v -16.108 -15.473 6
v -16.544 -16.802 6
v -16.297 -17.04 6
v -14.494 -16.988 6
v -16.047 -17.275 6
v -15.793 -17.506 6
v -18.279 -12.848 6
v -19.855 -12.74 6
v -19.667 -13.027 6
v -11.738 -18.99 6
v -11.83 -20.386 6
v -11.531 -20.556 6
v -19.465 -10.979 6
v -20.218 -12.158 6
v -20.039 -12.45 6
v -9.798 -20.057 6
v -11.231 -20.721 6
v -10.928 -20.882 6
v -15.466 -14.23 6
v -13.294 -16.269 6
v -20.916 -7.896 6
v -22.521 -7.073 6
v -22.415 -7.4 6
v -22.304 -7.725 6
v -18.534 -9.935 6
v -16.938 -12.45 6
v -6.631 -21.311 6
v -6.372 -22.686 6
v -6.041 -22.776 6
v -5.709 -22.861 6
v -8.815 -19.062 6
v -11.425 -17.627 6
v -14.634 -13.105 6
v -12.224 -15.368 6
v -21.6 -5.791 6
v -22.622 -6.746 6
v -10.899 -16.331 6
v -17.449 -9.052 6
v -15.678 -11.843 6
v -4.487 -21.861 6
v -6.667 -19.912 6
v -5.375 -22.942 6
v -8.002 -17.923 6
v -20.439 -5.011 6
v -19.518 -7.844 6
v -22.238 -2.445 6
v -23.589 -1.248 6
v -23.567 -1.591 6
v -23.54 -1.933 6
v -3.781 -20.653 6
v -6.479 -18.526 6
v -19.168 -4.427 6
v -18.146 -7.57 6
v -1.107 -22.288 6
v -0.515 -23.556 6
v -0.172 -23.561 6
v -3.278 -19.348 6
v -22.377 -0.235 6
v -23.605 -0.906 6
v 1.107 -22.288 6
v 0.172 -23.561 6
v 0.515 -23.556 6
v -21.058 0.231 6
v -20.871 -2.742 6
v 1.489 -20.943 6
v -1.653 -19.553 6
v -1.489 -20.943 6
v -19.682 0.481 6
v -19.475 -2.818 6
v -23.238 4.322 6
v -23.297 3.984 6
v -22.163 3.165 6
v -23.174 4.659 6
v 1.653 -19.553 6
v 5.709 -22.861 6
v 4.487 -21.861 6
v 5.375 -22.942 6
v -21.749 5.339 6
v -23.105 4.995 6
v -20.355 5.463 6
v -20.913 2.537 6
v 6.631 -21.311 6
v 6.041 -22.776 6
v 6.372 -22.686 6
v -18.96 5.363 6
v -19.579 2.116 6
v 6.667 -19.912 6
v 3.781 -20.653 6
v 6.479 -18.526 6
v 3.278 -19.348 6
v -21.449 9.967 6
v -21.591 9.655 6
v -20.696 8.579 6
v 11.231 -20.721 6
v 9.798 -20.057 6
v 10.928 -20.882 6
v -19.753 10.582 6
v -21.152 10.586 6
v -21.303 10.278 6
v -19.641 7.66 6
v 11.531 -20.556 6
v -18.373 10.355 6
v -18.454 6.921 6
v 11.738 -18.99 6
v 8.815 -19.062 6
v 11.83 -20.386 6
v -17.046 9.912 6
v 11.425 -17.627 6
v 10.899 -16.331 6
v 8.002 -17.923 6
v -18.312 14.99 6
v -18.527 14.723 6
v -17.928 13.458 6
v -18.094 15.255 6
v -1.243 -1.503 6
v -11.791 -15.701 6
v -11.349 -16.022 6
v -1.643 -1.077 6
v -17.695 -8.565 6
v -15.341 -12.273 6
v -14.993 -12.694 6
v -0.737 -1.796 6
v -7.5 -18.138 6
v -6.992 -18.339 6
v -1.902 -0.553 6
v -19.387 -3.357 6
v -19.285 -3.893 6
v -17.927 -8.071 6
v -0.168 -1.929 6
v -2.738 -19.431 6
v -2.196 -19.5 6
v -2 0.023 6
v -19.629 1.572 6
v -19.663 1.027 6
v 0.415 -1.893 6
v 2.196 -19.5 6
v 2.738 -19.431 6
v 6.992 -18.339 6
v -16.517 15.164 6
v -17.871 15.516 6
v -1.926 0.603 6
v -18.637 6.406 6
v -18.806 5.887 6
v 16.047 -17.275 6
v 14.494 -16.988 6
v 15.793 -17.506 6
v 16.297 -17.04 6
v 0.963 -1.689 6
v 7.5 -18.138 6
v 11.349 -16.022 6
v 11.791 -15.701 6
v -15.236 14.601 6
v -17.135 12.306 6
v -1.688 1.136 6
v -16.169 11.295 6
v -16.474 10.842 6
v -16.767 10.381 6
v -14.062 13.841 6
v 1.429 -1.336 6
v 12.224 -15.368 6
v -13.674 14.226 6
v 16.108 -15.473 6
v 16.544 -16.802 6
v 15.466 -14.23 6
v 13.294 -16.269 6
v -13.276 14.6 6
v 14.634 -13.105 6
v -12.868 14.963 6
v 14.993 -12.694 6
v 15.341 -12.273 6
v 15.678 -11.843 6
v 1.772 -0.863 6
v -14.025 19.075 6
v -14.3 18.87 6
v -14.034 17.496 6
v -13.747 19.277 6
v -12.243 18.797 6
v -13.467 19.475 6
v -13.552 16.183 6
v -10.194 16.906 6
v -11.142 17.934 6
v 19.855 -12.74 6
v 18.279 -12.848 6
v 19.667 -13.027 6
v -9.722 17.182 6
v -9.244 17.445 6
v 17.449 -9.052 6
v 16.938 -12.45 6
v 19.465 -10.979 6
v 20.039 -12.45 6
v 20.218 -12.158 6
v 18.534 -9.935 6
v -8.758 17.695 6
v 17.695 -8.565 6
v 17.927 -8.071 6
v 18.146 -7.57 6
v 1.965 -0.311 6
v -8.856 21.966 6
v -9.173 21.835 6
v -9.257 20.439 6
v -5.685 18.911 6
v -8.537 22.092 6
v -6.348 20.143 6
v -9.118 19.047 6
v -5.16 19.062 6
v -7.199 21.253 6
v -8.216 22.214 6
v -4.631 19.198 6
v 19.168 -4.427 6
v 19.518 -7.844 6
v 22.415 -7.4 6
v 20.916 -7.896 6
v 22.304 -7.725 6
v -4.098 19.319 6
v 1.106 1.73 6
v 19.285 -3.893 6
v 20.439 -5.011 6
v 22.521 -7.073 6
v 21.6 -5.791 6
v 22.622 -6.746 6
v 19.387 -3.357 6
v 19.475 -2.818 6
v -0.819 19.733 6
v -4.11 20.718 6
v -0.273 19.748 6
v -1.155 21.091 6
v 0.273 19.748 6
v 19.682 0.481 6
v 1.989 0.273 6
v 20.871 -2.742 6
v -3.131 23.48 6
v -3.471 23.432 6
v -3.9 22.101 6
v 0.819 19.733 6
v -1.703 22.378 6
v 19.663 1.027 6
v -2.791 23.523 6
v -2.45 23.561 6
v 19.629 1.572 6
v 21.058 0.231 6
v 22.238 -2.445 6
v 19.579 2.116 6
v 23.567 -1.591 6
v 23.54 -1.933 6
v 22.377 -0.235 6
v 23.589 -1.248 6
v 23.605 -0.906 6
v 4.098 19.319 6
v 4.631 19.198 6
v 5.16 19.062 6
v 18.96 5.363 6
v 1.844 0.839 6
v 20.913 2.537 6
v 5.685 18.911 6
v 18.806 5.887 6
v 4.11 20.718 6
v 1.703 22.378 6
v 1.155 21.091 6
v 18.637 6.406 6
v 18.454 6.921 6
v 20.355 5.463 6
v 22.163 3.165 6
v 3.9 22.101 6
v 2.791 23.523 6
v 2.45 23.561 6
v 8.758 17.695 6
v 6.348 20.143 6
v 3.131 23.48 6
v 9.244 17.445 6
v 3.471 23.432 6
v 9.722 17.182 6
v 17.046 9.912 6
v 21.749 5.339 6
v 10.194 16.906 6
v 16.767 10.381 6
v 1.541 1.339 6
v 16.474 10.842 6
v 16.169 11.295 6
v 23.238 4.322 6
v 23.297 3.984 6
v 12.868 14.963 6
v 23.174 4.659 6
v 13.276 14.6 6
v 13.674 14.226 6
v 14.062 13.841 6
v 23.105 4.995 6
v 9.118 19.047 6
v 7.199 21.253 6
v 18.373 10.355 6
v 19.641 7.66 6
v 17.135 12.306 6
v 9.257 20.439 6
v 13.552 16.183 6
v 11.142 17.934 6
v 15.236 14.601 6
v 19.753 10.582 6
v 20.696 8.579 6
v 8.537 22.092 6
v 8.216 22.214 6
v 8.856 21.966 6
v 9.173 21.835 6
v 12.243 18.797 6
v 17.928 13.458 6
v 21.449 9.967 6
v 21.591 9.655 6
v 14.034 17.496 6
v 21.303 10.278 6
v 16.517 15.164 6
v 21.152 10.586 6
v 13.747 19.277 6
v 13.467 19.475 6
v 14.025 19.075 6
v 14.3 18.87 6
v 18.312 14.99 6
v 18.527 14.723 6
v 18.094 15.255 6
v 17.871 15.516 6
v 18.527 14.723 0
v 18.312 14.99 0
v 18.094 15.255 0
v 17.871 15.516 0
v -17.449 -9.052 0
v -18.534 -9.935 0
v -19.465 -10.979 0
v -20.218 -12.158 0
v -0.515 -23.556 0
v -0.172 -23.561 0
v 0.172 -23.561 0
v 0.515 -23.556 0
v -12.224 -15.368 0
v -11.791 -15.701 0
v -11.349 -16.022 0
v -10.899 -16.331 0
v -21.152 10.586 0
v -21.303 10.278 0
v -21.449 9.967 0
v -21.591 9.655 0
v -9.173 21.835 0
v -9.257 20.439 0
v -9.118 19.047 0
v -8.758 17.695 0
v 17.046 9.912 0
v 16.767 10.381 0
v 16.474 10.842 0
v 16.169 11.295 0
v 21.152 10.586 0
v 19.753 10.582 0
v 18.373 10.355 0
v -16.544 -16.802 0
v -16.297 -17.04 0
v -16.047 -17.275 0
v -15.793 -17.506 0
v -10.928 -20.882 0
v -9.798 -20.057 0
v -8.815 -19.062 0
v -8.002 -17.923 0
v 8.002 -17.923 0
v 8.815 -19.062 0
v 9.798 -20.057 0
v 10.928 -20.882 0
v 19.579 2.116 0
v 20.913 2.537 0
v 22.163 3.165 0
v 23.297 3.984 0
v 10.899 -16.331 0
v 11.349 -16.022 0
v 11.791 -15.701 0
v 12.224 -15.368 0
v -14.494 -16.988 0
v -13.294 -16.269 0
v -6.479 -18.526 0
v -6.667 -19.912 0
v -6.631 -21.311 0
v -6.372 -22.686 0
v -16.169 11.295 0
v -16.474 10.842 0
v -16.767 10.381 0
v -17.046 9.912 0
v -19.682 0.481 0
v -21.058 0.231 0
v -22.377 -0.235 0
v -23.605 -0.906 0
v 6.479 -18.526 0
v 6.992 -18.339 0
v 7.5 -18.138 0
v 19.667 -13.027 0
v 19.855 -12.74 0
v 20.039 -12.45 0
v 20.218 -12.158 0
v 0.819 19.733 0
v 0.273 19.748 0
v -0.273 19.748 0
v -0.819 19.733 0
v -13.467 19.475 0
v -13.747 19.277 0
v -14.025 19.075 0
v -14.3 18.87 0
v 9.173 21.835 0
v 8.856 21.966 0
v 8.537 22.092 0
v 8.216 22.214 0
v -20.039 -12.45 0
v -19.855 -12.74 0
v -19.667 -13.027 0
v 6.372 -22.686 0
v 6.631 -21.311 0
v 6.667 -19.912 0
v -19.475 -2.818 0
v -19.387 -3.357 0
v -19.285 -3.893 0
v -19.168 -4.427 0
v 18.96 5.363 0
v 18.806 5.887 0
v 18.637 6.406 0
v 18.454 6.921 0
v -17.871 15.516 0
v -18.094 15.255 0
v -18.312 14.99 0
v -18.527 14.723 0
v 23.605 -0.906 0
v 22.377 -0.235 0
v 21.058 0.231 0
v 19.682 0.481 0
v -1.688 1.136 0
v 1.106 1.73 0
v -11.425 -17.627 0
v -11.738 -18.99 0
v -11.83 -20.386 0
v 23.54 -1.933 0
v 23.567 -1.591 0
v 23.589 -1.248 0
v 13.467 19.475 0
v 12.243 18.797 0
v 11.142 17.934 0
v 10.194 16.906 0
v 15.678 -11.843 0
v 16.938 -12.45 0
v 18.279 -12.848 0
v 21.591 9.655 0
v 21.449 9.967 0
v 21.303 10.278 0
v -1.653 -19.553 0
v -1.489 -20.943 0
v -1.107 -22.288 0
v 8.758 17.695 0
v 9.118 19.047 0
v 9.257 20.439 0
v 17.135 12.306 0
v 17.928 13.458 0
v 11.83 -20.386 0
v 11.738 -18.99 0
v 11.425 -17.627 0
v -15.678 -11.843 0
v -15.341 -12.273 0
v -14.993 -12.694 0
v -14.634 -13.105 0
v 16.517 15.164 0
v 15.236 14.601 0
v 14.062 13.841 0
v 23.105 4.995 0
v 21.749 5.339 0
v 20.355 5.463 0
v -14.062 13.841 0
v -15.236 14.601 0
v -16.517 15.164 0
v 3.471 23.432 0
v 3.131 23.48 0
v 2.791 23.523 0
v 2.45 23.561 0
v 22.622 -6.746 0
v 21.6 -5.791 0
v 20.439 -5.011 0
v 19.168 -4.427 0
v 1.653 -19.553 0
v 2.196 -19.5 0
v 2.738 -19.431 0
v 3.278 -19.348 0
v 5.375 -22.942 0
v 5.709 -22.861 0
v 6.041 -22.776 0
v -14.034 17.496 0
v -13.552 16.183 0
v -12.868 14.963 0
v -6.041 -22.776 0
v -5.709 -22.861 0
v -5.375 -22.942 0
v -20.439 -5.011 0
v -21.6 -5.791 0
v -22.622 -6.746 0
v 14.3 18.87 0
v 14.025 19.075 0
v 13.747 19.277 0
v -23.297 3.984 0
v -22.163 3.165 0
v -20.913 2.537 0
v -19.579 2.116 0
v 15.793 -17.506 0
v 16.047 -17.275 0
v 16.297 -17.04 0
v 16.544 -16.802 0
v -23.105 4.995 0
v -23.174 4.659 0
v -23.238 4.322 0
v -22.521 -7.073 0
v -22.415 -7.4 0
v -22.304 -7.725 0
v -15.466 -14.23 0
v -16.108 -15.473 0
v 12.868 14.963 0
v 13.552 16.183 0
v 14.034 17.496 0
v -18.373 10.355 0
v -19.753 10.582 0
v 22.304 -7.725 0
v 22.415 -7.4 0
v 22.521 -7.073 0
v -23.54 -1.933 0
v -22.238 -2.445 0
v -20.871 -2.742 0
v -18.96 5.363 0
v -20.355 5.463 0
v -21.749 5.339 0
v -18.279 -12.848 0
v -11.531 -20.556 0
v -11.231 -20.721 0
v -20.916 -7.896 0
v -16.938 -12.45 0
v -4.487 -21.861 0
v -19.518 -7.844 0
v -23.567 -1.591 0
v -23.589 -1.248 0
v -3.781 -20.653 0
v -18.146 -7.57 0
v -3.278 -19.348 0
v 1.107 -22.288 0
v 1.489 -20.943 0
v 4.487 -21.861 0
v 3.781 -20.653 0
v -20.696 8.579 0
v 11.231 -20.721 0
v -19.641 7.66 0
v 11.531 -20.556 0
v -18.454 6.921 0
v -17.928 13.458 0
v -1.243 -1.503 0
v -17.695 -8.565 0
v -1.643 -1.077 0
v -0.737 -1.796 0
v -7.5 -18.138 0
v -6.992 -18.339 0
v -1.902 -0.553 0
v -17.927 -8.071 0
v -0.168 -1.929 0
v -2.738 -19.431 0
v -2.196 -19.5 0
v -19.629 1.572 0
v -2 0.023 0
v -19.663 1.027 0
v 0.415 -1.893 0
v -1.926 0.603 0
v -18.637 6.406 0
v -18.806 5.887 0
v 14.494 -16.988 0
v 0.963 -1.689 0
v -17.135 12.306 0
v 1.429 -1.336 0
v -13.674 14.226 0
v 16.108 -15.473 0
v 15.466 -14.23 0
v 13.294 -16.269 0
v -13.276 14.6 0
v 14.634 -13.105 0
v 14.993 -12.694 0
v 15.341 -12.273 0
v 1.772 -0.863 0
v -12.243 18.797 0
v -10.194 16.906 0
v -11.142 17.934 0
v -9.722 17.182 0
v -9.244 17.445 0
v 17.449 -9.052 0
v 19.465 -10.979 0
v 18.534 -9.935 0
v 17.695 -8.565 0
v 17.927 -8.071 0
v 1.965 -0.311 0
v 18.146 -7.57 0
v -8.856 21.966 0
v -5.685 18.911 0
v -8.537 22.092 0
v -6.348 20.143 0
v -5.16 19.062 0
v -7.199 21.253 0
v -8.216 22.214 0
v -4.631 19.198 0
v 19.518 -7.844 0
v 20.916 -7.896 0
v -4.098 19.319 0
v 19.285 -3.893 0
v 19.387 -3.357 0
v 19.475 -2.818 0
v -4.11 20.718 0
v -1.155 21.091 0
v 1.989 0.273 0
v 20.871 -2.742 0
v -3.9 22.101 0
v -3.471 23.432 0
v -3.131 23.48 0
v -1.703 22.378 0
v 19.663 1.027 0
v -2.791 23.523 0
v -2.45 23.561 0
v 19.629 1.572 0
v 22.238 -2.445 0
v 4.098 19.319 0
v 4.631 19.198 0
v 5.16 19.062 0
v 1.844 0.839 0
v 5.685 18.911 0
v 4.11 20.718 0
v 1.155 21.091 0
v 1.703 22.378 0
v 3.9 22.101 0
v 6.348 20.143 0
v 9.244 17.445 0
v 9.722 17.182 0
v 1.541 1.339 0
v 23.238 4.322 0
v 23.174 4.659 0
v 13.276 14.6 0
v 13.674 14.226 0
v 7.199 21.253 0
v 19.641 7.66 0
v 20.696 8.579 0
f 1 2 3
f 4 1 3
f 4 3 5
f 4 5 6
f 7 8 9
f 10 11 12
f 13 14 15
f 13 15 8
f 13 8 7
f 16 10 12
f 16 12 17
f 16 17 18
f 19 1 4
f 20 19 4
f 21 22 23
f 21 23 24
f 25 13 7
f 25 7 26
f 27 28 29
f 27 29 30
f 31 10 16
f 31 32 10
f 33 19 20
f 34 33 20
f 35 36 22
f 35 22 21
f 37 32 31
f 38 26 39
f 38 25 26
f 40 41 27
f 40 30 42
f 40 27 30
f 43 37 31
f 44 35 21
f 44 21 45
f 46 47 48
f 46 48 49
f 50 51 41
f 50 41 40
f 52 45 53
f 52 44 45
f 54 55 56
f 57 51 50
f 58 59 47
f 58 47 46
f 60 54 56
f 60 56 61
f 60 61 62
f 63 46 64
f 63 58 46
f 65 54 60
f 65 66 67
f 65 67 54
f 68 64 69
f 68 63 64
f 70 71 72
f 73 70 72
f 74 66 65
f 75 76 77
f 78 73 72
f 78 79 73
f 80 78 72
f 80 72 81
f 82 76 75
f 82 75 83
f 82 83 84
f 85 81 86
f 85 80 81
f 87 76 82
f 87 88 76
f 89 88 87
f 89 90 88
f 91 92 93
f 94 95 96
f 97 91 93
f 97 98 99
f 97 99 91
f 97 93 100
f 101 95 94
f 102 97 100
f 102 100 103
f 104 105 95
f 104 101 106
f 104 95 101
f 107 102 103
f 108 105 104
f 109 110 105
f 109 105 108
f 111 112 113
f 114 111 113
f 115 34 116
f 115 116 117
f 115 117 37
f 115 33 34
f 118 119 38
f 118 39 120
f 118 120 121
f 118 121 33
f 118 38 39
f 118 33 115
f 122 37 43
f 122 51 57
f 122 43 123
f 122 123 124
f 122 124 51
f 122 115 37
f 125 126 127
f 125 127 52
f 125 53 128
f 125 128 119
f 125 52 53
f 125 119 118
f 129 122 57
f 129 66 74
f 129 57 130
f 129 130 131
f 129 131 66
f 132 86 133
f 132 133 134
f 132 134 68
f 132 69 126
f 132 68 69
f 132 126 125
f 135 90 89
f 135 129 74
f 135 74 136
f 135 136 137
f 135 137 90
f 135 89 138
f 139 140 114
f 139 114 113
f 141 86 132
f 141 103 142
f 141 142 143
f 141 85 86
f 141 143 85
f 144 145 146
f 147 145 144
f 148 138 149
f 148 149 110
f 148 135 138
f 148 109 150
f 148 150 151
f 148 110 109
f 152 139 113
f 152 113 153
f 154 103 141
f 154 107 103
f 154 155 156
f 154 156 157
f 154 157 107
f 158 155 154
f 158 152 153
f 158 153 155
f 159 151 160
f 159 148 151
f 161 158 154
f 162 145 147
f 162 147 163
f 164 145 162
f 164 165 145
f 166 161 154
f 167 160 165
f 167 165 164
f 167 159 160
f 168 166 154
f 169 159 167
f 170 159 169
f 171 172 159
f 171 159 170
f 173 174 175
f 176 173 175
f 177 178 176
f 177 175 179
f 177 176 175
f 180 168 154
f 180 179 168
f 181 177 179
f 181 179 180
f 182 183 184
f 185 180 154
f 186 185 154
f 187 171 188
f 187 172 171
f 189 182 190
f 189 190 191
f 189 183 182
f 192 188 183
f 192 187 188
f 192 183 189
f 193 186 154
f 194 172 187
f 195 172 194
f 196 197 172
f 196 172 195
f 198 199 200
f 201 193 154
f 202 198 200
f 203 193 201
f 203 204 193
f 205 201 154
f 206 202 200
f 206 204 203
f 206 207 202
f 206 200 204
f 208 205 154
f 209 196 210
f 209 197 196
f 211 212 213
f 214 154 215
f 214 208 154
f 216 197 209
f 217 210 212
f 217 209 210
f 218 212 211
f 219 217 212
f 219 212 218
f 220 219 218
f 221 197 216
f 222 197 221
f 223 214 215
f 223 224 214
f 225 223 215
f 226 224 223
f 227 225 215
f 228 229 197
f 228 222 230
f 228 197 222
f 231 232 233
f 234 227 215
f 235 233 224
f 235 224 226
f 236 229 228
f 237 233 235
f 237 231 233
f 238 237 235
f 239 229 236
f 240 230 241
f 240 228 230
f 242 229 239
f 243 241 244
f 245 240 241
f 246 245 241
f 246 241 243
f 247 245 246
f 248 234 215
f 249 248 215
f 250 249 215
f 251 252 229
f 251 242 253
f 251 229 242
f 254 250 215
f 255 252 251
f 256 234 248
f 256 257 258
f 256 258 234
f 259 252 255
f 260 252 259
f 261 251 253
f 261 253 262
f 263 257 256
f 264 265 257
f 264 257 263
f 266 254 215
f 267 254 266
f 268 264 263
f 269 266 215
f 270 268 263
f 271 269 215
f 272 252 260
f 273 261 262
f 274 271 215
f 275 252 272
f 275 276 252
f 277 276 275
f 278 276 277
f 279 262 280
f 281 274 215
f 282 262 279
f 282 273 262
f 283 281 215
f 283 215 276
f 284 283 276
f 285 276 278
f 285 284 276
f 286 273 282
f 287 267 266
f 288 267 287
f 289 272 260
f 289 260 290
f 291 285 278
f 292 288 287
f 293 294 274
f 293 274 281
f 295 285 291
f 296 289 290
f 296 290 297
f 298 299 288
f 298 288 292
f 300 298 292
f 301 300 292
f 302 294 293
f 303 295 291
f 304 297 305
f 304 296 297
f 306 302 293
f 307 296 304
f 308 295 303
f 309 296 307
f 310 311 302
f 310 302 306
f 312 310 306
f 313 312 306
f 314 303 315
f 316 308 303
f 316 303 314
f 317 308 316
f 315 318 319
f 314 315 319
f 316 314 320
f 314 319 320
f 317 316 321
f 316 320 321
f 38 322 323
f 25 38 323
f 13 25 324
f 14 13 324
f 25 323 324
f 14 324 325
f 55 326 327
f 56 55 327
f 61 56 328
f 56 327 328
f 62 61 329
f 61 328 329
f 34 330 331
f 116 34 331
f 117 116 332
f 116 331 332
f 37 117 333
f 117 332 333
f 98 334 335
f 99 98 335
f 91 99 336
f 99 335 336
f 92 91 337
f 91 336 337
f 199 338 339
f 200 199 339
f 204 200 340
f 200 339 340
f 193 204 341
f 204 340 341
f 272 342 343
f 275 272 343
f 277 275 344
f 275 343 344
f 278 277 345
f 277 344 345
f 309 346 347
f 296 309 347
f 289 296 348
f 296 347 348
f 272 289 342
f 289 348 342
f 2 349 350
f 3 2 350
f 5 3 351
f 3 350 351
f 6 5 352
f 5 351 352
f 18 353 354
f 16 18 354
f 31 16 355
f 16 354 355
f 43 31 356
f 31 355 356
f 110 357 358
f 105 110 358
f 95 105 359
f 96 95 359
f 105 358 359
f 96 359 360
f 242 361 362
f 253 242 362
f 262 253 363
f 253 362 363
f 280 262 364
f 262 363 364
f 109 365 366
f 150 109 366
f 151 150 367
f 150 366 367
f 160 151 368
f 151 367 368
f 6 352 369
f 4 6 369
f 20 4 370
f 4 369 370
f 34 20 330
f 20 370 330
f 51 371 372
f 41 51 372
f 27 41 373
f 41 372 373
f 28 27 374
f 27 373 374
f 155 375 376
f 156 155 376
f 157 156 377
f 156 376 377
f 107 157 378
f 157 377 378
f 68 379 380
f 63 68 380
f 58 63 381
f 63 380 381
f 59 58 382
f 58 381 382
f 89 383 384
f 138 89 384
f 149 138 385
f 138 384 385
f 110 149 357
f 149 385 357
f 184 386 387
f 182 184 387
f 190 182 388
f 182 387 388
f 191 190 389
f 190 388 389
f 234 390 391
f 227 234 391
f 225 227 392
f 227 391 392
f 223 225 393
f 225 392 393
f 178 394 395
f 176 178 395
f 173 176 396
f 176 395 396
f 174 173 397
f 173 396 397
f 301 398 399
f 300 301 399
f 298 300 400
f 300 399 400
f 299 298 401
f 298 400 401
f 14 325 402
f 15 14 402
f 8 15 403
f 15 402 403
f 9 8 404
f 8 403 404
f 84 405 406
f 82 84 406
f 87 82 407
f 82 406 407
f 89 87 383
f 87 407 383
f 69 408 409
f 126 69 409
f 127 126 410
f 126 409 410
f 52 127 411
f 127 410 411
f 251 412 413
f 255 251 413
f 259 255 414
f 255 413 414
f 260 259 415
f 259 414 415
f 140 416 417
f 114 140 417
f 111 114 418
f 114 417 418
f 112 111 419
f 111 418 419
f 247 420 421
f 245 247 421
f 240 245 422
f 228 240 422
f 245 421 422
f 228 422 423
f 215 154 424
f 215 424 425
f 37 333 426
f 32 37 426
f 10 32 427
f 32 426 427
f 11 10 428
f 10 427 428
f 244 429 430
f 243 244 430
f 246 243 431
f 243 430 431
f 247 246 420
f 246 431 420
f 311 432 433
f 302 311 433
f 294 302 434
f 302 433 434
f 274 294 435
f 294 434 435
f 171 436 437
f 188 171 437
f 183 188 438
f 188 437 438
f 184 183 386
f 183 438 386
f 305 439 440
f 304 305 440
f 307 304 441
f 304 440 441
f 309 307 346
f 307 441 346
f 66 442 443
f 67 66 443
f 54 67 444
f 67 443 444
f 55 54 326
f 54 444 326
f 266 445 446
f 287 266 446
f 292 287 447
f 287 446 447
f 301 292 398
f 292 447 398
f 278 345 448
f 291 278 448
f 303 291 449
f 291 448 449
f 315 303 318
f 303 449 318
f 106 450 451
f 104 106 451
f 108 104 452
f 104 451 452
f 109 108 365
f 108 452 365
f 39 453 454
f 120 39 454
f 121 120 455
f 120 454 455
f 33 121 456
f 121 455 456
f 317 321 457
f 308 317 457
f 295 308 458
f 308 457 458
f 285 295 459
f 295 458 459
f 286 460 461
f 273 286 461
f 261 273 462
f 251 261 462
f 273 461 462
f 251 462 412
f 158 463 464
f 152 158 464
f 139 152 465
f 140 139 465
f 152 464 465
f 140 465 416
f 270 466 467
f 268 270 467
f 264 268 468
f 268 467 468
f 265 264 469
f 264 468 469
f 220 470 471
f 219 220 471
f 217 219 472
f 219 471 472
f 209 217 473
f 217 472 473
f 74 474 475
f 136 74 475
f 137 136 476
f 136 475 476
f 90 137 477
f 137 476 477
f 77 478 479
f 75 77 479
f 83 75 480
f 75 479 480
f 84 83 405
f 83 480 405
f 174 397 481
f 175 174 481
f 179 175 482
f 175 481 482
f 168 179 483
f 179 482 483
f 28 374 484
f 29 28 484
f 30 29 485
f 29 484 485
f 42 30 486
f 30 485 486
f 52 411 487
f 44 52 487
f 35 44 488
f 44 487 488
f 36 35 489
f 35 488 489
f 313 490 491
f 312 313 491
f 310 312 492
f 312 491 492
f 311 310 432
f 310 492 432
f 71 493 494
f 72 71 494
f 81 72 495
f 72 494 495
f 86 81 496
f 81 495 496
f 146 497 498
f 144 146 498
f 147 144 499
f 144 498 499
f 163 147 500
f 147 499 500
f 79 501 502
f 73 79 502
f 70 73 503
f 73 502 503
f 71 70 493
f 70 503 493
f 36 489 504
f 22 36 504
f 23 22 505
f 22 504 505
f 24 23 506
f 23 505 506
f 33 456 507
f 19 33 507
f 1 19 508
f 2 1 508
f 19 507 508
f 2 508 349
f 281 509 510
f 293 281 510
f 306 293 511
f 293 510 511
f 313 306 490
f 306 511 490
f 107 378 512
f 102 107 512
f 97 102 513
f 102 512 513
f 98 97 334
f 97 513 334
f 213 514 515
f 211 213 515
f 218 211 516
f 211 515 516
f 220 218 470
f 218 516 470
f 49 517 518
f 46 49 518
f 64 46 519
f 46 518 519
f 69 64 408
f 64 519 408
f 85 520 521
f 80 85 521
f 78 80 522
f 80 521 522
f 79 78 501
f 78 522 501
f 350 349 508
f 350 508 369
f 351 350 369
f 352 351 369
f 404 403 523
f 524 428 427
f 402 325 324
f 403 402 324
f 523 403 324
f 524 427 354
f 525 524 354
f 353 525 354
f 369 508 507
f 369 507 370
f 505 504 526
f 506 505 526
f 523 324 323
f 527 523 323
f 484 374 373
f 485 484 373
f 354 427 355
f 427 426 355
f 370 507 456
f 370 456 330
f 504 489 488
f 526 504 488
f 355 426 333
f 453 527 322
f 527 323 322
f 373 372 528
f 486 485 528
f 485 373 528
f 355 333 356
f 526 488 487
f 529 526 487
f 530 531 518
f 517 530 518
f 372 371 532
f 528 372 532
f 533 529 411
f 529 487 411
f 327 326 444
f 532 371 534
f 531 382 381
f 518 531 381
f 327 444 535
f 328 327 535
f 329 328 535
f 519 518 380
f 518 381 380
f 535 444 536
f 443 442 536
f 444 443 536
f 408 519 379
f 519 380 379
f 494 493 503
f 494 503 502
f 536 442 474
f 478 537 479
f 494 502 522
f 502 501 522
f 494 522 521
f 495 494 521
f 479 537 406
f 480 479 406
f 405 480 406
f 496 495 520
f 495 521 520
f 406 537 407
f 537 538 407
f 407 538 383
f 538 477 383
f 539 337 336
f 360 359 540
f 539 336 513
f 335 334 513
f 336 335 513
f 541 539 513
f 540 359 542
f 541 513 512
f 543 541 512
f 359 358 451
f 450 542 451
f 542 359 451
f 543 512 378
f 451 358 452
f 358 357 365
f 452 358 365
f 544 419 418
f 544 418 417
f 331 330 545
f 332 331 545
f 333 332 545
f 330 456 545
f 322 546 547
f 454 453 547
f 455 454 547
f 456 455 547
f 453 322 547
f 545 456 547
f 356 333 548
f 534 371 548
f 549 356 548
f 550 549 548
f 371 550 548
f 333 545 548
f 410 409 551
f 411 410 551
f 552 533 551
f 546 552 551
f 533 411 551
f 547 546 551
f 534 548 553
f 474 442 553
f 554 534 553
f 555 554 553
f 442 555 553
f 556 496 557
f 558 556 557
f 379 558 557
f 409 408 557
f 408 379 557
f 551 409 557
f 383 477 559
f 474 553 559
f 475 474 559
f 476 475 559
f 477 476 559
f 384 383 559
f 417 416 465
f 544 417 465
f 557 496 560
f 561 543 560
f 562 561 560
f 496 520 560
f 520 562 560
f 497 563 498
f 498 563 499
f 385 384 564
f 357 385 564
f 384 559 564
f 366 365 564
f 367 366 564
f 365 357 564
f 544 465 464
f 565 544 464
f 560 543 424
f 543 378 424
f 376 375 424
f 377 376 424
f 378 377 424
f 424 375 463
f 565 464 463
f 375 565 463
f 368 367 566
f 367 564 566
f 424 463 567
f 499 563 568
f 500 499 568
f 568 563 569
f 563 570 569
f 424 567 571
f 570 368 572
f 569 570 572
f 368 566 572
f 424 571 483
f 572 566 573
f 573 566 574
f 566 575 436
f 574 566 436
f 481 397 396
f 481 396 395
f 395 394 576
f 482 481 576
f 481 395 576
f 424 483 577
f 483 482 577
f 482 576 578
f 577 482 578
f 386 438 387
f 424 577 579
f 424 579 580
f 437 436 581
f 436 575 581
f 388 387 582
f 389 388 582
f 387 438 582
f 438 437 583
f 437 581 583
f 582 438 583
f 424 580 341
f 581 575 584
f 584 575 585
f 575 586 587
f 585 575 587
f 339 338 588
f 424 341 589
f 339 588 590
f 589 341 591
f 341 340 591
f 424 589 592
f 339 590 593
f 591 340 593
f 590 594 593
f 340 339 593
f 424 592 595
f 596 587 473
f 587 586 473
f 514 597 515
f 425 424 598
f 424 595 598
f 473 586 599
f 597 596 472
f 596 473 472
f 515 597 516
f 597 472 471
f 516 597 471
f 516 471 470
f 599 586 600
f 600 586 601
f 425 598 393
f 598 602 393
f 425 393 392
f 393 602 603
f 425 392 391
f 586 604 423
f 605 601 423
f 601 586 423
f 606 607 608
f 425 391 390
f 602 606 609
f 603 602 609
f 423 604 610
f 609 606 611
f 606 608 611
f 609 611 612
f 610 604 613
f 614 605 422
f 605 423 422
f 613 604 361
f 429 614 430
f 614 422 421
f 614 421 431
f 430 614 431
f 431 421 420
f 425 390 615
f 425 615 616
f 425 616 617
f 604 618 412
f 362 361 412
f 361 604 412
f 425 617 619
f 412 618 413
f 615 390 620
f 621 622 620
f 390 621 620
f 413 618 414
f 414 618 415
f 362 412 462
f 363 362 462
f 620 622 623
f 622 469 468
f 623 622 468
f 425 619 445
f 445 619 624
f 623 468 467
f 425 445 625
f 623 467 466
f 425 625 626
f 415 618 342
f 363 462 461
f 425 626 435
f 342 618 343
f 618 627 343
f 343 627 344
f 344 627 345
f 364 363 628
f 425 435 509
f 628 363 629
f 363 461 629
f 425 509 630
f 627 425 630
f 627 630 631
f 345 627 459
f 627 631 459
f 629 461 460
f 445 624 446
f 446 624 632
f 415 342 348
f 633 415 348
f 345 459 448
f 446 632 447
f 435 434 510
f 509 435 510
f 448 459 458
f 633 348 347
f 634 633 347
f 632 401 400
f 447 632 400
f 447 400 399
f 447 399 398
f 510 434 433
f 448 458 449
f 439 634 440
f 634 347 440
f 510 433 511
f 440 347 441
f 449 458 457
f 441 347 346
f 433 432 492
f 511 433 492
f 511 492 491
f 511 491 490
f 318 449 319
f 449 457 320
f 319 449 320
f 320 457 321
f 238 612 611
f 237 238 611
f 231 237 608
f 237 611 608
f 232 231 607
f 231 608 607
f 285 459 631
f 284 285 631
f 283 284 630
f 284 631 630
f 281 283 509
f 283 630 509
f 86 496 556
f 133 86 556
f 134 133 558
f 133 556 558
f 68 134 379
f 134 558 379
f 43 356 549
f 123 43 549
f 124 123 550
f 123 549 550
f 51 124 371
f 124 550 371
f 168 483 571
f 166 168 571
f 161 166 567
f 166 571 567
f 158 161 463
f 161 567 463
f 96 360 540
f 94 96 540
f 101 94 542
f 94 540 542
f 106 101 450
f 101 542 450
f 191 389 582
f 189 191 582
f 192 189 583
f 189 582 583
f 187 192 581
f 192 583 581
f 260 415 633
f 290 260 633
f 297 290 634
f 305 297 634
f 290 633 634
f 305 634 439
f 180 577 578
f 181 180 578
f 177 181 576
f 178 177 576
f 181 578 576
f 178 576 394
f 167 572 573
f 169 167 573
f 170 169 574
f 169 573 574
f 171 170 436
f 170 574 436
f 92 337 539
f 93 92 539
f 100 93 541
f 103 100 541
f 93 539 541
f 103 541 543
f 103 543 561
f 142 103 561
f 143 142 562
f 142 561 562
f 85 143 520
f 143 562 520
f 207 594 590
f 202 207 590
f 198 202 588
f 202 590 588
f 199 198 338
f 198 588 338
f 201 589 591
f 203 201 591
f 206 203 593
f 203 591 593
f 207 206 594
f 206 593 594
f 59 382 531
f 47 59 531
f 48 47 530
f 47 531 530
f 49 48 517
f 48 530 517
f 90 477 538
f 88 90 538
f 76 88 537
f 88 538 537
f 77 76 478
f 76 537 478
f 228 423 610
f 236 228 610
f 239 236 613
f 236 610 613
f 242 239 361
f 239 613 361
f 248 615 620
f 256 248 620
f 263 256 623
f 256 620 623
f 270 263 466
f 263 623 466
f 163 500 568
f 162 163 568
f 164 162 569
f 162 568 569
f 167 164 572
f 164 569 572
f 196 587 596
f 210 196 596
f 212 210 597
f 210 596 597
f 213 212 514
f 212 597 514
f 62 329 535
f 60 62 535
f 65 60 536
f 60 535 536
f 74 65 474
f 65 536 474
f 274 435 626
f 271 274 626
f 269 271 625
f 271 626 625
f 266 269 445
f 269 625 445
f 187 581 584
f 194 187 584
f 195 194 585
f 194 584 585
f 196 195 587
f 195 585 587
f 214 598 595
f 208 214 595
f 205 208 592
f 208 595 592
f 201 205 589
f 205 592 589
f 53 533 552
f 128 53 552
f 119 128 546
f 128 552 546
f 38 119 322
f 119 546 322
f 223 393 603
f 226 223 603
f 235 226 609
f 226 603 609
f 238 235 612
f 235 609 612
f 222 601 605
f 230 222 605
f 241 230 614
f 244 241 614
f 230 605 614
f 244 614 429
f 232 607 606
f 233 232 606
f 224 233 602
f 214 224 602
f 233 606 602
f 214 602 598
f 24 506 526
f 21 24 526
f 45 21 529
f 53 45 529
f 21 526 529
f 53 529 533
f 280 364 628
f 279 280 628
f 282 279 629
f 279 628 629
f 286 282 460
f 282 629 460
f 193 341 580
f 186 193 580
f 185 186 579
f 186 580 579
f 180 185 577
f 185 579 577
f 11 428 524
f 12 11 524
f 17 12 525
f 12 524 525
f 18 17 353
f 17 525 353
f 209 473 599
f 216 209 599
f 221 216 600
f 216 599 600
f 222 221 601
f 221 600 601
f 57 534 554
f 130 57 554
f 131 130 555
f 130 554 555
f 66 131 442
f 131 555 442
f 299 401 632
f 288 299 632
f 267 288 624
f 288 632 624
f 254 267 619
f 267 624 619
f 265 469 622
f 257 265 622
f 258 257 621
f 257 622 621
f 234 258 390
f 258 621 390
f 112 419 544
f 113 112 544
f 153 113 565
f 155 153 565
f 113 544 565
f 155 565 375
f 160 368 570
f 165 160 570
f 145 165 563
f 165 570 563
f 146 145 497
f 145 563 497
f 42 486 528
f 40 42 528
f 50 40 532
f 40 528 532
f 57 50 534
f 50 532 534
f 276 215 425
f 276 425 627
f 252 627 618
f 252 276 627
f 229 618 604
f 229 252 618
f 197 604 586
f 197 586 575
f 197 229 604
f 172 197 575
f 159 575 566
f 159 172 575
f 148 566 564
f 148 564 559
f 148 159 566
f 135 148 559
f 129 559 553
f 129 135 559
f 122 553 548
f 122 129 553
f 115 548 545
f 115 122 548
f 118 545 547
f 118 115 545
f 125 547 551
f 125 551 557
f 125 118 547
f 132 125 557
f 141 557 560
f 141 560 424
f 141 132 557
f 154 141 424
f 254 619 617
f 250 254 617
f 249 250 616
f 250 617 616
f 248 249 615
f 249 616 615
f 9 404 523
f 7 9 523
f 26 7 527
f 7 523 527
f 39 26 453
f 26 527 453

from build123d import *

# Parameters (mm, degrees)
BOSS_EXTRUDE1_DEPTH = 6
CUT_EXTRUDE1_DEPTH  = 6


with BuildPart() as part:
    # Sketch1 → Boss-Extrude1 (new body)
    with BuildSketch(Plane.XY):
        with BuildLine():
            ThreePointArc((-23.297478626, 3.98388923), (-21.550990273, 2.825758414), (-19.579218077, 2.11610853))
            ThreePointArc((-19.579218077, 2.11610853), (-19.647653189, 1.299796091), (-19.682068786, 0.481343326))
            ThreePointArc((-19.682068786, 0.481343326), (-21.727235684, 0.024417829), (-23.605104735, -0.905687747))
            ThreePointArc((-23.605104735, -0.905687747), (-23.578381459, -1.419755495), (-23.540464241, -1.93311898))
            ThreePointArc((-23.540464241, -1.93311898), (-21.560829609, -2.620530995), (-19.474521512, -2.817526118))
            ThreePointArc((-19.474521512, -2.817526118), (-19.337797961, -3.625211721), (-19.167591403, -4.426510099))
            ThreePointArc((-19.167591403, -4.426510099), (-21.034872872, -5.377692766), (-22.622437362, -6.745584408))
            ThreePointArc((-22.622437362, -6.745584408), (-22.468710197, -7.236855963), (-22.304315911, -7.724661561))
            ThreePointArc((-22.304315911, -7.724661561), (-20.215922725, -7.898162151), (-18.146169139, -7.570124585))
            ThreePointArc((-18.146169139, -7.570124585), (-17.812877768, -8.318433495), (-17.448743759, -9.052228961))
            ThreePointArc((-17.448743759, -9.052228961), (-19.020811637, -10.437902494), (-20.218319051, -12.157630537))
            ThreePointArc((-20.218319051, -12.157630537), (-19.94724724, -12.595237503), (-19.666705383, -13.026834594))
            ThreePointArc((-19.666705383, -13.026834594), (-17.600775067, -12.675522078), (-15.677626222, -11.843063629))
            ThreePointArc((-15.677626222, -11.843063629), (-15.168708954, -12.484976846), (-14.633527372, -13.105162332))
            ThreePointArc((-14.633527372, -13.105162332), (-15.811602852, -14.838259766), (-16.543809396, -16.801767375))
            ThreePointArc((-16.543809396, -16.801767375), (-16.172425378, -17.158213294), (-15.793363427, -17.506483047))
            ThreePointArc((-15.793363427, -17.506483047), (-13.879705981, -16.652431682), (-12.22400039, -15.367858777))
            ThreePointArc((-12.22400039, -15.367858777), (-11.571434369, -15.863042531), (-10.898832642, -16.330649503))
            ThreePointArc((-10.898832642, -16.330649503), (-11.60889291, -18.302273952), (-11.829791353, -20.386186721))
            ThreePointArc((-11.829791353, -20.386186721), (-11.381430551, -20.639074787), (-10.927666363, -20.882134132))
            ThreePointArc((-10.927666363, -20.882134132), (-9.286523922, -19.579007107), (-8.002295658, -17.923034185))
            ThreePointArc((-8.002295658, -17.923034185), (-7.247084006, -18.240374261), (-6.479324175, -18.526021252))
            ThreePointArc((-6.479324175, -18.526021252), (-6.676753531, -20.612288301), (-6.372464012, -22.685666328))
            ThreePointArc((-6.372464012, -22.685666328), (-5.875298584, -22.819106653), (-5.375343832, -22.941683276))
            ThreePointArc((-5.375343832, -22.941683276), (-4.109835412, -21.271360855), (-3.277777259, -19.348038785))
            ThreePointArc((-3.277777259, -19.348038785), (-2.467372703, -19.467595539), (-1.65269594, -19.553334298))
            ThreePointArc((-1.65269594, -19.553334298), (-1.325089173, -21.623156117), (-0.514731321, -23.555721434))
            ThreePointArc((-0.514731321, -23.555721434), (0, -23.561329471), (0.514731321, -23.555721434))
            ThreePointArc((0.514731321, -23.555721434), (1.325089173, -21.623156117), (1.65269594, -19.553334298))
            ThreePointArc((1.65269594, -19.553334298), (2.467372703, -19.467595539), (3.277777259, -19.348038785))
            ThreePointArc((3.277777259, -19.348038785), (4.109835412, -21.271360855), (5.375343832, -22.941683276))
            ThreePointArc((5.375343832, -22.941683276), (5.875298584, -22.819106653), (6.372464012, -22.685666328))
            ThreePointArc((6.372464012, -22.685666328), (6.676753531, -20.612288301), (6.479324175, -18.526021252))
            ThreePointArc((6.479324175, -18.526021252), (7.247084006, -18.240374261), (8.002295658, -17.923034185))
            ThreePointArc((8.002295658, -17.923034185), (9.286523922, -19.579007107), (10.927666363, -20.882134132))
            ThreePointArc((10.927666363, -20.882134132), (11.381430551, -20.639074787), (11.829791353, -20.386186721))
            ThreePointArc((11.829791353, -20.386186721), (11.60889291, -18.302273952), (10.898832642, -16.330649503))
            ThreePointArc((10.898832642, -16.330649503), (11.571434369, -15.863042531), (12.22400039, -15.367858777))
            ThreePointArc((12.22400039, -15.367858777), (13.879705981, -16.652431682), (15.793363427, -17.506483047))
            ThreePointArc((15.793363427, -17.506483047), (16.172425378, -17.158213294), (16.543809396, -16.801767375))
            ThreePointArc((16.543809396, -16.801767375), (15.811602852, -14.838259766), (14.633527372, -13.105162332))
            ThreePointArc((14.633527372, -13.105162332), (15.168708954, -12.484976846), (15.677626222, -11.843063629))
            ThreePointArc((15.677626222, -11.843063629), (17.600775067, -12.675522078), (19.666705383, -13.026834594))
            ThreePointArc((19.666705383, -13.026834594), (19.94724724, -12.595237503), (20.218319051, -12.157630537))
            ThreePointArc((20.218319051, -12.157630537), (19.020811637, -10.437902494), (17.448743759, -9.052228961))
            ThreePointArc((17.448743759, -9.052228961), (17.812877768, -8.318433495), (18.146169139, -7.570124585))
            ThreePointArc((18.146169139, -7.570124585), (20.215922725, -7.898162151), (22.304315911, -7.724661561))
            ThreePointArc((22.304315911, -7.724661561), (22.468710197, -7.236855963), (22.622437362, -6.745584408))
            ThreePointArc((22.622437362, -6.745584408), (21.034872872, -5.377692766), (19.167591403, -4.426510099))
            ThreePointArc((19.167591403, -4.426510099), (19.337797961, -3.625211721), (19.474521512, -2.817526118))
            ThreePointArc((19.474521512, -2.817526118), (21.560829609, -2.620530995), (23.540464241, -1.93311898))
            ThreePointArc((23.540464241, -1.93311898), (23.578381459, -1.419755495), (23.605104735, -0.905687747))
            ThreePointArc((23.605104735, -0.905687747), (21.727235684, 0.024417829), (19.682068786, 0.481343326))
            ThreePointArc((19.682068786, 0.481343326), (19.647653189, 1.299796091), (19.579218077, 2.11610853))
            ThreePointArc((19.579218077, 2.11610853), (21.550990273, 2.825758414), (23.297478626, 3.98388923))
            ThreePointArc((23.297478626, 3.98388923), (23.206536298, 4.490554086), (23.104576563, 4.995117258))
            ThreePointArc((23.104576563, 4.995117258), (21.054396371, 5.428994815), (18.959849401, 5.362952832))
            ThreePointArc((18.959849401, 5.362952832), (18.722974108, 6.147133588), (18.453680362, 6.920780951))
            ThreePointArc((18.453680362, 6.920780951), (20.18702296, 8.098495683), (21.590626747, 9.654575682))
            ThreePointArc((21.590626747, 9.654575682), (21.376539115, 10.122706292), (21.152302873, 10.586061329))
            ThreePointArc((21.152302873, 10.586061329), (19.058631901, 10.496448744), (17.046312949, 9.911588942))
            ThreePointArc((17.046312949, 9.911588942), (16.621861705, 10.612224728), (16.168630043, 11.294595904))
            ThreePointArc((16.168630043, 11.294595904), (17.554630751, 12.866375338), (18.527156386, 14.722630289))
            ThreePointArc((18.527156386, 14.722630289), (18.203375361, 15.122812286), (17.870952201, 15.515844888))
            ThreePointArc((17.870952201, 15.515844888), (15.865343497, 14.908372849), (14.061693963, 13.84144412))
            ThreePointArc((14.061693963, 13.84144412), (13.476336601, 14.414511412), (12.867645233, 14.962730512))
            ThreePointArc((12.867645233, 14.962730512), (13.819216531, 16.829813965), (14.29955665, 18.869608544))
            ThreePointArc((14.29955665, 18.869608544), (13.886426585, 19.176697021), (13.466703877, 19.474711502))
            ThreePointArc((13.466703877, 19.474711502), (11.675177211, 18.387549712), (10.19352703, 16.905591112))
            ThreePointArc((10.19352703, 16.905591112), (9.484043705, 17.315081985), (8.75813895, 17.694702387))
            ThreePointArc((8.75813895, 17.694702387), (9.215490113, 19.739774138), (9.17346318, 21.834940549))
            ThreePointArc((9.17346318, 21.834940549), (8.696942557, 22.029640008), (8.216293022, 22.213911023))
            ThreePointArc((8.216293022, 22.213911023), (6.751416603, 20.715369856), (5.684863304, 18.911498294))
            ThreePointArc((5.684863304, 18.911498294), (4.895833464, 19.13168293), (4.098326587, 19.318851687))
            ThreePointArc((4.098326587, 19.318851687), (4.032720558, 21.413412357), (3.47096728, 23.43230359))
            ThreePointArc((3.47096728, 23.43230359), (2.960997643, 23.502380347), (2.449622259, 23.561329471))
            ThreePointArc((2.449622259, 23.561329471), (1.40343966, 21.745567779), (0.818998709, 19.733127139))
            ThreePointArc((0.818998709, 19.733127139), (0, 19.750170529), (-0.818998709, 19.733127139))
            ThreePointArc((-0.818998709, 19.733127139), (-1.40343966, 21.745567779), (-2.449622259, 23.561329471))
            ThreePointArc((-2.449622259, 23.561329471), (-2.960997643, 23.502380347), (-3.47096728, 23.43230359))
            ThreePointArc((-3.47096728, 23.43230359), (-4.032720558, 21.413412357), (-4.098326587, 19.318851687))
            ThreePointArc((-4.098326587, 19.318851687), (-4.895833464, 19.13168293), (-5.684863304, 18.911498294))
            ThreePointArc((-5.684863304, 18.911498294), (-6.751416603, 20.715369856), (-8.216293022, 22.213911023))
            ThreePointArc((-8.216293022, 22.213911023), (-8.696942557, 22.029640008), (-9.17346318, 21.834940549))
            ThreePointArc((-9.17346318, 21.834940549), (-9.215490113, 19.739774138), (-8.75813895, 17.694702387))
            ThreePointArc((-8.75813895, 17.694702387), (-9.484043705, 17.315081985), (-10.19352703, 16.905591112))
            ThreePointArc((-10.19352703, 16.905591112), (-11.675177211, 18.387549712), (-13.466703877, 19.474711502))
            ThreePointArc((-13.466703877, 19.474711502), (-13.886426585, 19.176697021), (-14.29955665, 18.869608544))
            ThreePointArc((-14.29955665, 18.869608544), (-13.819216531, 16.829813965), (-12.867645233, 14.962730512))
            ThreePointArc((-12.867645233, 14.962730512), (-13.476336601, 14.414511412), (-14.061693963, 13.84144412))
            ThreePointArc((-14.061693963, 13.84144412), (-15.865343497, 14.908372849), (-17.870952201, 15.515844888))
            ThreePointArc((-17.870952201, 15.515844888), (-18.203375361, 15.122812286), (-18.527156386, 14.722630289))
            ThreePointArc((-18.527156386, 14.722630289), (-17.554630751, 12.866375338), (-16.168630043, 11.294595904))
            ThreePointArc((-16.168630043, 11.294595904), (-16.621861705, 10.612224728), (-17.046312949, 9.911588942))
            ThreePointArc((-17.046312949, 9.911588942), (-19.058631901, 10.496448744), (-21.152302873, 10.586061329))
            ThreePointArc((-21.152302873, 10.586061329), (-21.376539115, 10.122706292), (-21.590626747, 9.654575682))
            ThreePointArc((-21.590626747, 9.654575682), (-20.18702296, 8.098495683), (-18.453680362, 6.920780951))
            ThreePointArc((-18.453680362, 6.920780951), (-18.722974108, 6.147133588), (-18.959849401, 5.362952832))
            ThreePointArc((-18.959849401, 5.362952832), (-21.054396371, 5.428994815), (-23.104576563, 4.995117258))
            ThreePointArc((-23.104576563, 4.995117258), (-23.206536298, 4.490554086), (-23.297478626, 3.98388923))
        make_face()
    extrude(amount=BOSS_EXTRUDE1_DEPTH)

    # Sketch2 → Cut-Extrude1 (cut)
    with BuildSketch(Plane.XY.offset(6)):
        with BuildLine():
            Line((-1.68792147, 1.136480442), (1.106353759, 1.729798183))
            ThreePointArc((1.106353759, 1.729798183), (0.415405508, -1.892713448), (-1.68792147, 1.136480442))
        make_face()
    extrude(amount=-CUT_EXTRUDE1_DEPTH, mode=Mode.SUBTRACT)


solid = part.part
